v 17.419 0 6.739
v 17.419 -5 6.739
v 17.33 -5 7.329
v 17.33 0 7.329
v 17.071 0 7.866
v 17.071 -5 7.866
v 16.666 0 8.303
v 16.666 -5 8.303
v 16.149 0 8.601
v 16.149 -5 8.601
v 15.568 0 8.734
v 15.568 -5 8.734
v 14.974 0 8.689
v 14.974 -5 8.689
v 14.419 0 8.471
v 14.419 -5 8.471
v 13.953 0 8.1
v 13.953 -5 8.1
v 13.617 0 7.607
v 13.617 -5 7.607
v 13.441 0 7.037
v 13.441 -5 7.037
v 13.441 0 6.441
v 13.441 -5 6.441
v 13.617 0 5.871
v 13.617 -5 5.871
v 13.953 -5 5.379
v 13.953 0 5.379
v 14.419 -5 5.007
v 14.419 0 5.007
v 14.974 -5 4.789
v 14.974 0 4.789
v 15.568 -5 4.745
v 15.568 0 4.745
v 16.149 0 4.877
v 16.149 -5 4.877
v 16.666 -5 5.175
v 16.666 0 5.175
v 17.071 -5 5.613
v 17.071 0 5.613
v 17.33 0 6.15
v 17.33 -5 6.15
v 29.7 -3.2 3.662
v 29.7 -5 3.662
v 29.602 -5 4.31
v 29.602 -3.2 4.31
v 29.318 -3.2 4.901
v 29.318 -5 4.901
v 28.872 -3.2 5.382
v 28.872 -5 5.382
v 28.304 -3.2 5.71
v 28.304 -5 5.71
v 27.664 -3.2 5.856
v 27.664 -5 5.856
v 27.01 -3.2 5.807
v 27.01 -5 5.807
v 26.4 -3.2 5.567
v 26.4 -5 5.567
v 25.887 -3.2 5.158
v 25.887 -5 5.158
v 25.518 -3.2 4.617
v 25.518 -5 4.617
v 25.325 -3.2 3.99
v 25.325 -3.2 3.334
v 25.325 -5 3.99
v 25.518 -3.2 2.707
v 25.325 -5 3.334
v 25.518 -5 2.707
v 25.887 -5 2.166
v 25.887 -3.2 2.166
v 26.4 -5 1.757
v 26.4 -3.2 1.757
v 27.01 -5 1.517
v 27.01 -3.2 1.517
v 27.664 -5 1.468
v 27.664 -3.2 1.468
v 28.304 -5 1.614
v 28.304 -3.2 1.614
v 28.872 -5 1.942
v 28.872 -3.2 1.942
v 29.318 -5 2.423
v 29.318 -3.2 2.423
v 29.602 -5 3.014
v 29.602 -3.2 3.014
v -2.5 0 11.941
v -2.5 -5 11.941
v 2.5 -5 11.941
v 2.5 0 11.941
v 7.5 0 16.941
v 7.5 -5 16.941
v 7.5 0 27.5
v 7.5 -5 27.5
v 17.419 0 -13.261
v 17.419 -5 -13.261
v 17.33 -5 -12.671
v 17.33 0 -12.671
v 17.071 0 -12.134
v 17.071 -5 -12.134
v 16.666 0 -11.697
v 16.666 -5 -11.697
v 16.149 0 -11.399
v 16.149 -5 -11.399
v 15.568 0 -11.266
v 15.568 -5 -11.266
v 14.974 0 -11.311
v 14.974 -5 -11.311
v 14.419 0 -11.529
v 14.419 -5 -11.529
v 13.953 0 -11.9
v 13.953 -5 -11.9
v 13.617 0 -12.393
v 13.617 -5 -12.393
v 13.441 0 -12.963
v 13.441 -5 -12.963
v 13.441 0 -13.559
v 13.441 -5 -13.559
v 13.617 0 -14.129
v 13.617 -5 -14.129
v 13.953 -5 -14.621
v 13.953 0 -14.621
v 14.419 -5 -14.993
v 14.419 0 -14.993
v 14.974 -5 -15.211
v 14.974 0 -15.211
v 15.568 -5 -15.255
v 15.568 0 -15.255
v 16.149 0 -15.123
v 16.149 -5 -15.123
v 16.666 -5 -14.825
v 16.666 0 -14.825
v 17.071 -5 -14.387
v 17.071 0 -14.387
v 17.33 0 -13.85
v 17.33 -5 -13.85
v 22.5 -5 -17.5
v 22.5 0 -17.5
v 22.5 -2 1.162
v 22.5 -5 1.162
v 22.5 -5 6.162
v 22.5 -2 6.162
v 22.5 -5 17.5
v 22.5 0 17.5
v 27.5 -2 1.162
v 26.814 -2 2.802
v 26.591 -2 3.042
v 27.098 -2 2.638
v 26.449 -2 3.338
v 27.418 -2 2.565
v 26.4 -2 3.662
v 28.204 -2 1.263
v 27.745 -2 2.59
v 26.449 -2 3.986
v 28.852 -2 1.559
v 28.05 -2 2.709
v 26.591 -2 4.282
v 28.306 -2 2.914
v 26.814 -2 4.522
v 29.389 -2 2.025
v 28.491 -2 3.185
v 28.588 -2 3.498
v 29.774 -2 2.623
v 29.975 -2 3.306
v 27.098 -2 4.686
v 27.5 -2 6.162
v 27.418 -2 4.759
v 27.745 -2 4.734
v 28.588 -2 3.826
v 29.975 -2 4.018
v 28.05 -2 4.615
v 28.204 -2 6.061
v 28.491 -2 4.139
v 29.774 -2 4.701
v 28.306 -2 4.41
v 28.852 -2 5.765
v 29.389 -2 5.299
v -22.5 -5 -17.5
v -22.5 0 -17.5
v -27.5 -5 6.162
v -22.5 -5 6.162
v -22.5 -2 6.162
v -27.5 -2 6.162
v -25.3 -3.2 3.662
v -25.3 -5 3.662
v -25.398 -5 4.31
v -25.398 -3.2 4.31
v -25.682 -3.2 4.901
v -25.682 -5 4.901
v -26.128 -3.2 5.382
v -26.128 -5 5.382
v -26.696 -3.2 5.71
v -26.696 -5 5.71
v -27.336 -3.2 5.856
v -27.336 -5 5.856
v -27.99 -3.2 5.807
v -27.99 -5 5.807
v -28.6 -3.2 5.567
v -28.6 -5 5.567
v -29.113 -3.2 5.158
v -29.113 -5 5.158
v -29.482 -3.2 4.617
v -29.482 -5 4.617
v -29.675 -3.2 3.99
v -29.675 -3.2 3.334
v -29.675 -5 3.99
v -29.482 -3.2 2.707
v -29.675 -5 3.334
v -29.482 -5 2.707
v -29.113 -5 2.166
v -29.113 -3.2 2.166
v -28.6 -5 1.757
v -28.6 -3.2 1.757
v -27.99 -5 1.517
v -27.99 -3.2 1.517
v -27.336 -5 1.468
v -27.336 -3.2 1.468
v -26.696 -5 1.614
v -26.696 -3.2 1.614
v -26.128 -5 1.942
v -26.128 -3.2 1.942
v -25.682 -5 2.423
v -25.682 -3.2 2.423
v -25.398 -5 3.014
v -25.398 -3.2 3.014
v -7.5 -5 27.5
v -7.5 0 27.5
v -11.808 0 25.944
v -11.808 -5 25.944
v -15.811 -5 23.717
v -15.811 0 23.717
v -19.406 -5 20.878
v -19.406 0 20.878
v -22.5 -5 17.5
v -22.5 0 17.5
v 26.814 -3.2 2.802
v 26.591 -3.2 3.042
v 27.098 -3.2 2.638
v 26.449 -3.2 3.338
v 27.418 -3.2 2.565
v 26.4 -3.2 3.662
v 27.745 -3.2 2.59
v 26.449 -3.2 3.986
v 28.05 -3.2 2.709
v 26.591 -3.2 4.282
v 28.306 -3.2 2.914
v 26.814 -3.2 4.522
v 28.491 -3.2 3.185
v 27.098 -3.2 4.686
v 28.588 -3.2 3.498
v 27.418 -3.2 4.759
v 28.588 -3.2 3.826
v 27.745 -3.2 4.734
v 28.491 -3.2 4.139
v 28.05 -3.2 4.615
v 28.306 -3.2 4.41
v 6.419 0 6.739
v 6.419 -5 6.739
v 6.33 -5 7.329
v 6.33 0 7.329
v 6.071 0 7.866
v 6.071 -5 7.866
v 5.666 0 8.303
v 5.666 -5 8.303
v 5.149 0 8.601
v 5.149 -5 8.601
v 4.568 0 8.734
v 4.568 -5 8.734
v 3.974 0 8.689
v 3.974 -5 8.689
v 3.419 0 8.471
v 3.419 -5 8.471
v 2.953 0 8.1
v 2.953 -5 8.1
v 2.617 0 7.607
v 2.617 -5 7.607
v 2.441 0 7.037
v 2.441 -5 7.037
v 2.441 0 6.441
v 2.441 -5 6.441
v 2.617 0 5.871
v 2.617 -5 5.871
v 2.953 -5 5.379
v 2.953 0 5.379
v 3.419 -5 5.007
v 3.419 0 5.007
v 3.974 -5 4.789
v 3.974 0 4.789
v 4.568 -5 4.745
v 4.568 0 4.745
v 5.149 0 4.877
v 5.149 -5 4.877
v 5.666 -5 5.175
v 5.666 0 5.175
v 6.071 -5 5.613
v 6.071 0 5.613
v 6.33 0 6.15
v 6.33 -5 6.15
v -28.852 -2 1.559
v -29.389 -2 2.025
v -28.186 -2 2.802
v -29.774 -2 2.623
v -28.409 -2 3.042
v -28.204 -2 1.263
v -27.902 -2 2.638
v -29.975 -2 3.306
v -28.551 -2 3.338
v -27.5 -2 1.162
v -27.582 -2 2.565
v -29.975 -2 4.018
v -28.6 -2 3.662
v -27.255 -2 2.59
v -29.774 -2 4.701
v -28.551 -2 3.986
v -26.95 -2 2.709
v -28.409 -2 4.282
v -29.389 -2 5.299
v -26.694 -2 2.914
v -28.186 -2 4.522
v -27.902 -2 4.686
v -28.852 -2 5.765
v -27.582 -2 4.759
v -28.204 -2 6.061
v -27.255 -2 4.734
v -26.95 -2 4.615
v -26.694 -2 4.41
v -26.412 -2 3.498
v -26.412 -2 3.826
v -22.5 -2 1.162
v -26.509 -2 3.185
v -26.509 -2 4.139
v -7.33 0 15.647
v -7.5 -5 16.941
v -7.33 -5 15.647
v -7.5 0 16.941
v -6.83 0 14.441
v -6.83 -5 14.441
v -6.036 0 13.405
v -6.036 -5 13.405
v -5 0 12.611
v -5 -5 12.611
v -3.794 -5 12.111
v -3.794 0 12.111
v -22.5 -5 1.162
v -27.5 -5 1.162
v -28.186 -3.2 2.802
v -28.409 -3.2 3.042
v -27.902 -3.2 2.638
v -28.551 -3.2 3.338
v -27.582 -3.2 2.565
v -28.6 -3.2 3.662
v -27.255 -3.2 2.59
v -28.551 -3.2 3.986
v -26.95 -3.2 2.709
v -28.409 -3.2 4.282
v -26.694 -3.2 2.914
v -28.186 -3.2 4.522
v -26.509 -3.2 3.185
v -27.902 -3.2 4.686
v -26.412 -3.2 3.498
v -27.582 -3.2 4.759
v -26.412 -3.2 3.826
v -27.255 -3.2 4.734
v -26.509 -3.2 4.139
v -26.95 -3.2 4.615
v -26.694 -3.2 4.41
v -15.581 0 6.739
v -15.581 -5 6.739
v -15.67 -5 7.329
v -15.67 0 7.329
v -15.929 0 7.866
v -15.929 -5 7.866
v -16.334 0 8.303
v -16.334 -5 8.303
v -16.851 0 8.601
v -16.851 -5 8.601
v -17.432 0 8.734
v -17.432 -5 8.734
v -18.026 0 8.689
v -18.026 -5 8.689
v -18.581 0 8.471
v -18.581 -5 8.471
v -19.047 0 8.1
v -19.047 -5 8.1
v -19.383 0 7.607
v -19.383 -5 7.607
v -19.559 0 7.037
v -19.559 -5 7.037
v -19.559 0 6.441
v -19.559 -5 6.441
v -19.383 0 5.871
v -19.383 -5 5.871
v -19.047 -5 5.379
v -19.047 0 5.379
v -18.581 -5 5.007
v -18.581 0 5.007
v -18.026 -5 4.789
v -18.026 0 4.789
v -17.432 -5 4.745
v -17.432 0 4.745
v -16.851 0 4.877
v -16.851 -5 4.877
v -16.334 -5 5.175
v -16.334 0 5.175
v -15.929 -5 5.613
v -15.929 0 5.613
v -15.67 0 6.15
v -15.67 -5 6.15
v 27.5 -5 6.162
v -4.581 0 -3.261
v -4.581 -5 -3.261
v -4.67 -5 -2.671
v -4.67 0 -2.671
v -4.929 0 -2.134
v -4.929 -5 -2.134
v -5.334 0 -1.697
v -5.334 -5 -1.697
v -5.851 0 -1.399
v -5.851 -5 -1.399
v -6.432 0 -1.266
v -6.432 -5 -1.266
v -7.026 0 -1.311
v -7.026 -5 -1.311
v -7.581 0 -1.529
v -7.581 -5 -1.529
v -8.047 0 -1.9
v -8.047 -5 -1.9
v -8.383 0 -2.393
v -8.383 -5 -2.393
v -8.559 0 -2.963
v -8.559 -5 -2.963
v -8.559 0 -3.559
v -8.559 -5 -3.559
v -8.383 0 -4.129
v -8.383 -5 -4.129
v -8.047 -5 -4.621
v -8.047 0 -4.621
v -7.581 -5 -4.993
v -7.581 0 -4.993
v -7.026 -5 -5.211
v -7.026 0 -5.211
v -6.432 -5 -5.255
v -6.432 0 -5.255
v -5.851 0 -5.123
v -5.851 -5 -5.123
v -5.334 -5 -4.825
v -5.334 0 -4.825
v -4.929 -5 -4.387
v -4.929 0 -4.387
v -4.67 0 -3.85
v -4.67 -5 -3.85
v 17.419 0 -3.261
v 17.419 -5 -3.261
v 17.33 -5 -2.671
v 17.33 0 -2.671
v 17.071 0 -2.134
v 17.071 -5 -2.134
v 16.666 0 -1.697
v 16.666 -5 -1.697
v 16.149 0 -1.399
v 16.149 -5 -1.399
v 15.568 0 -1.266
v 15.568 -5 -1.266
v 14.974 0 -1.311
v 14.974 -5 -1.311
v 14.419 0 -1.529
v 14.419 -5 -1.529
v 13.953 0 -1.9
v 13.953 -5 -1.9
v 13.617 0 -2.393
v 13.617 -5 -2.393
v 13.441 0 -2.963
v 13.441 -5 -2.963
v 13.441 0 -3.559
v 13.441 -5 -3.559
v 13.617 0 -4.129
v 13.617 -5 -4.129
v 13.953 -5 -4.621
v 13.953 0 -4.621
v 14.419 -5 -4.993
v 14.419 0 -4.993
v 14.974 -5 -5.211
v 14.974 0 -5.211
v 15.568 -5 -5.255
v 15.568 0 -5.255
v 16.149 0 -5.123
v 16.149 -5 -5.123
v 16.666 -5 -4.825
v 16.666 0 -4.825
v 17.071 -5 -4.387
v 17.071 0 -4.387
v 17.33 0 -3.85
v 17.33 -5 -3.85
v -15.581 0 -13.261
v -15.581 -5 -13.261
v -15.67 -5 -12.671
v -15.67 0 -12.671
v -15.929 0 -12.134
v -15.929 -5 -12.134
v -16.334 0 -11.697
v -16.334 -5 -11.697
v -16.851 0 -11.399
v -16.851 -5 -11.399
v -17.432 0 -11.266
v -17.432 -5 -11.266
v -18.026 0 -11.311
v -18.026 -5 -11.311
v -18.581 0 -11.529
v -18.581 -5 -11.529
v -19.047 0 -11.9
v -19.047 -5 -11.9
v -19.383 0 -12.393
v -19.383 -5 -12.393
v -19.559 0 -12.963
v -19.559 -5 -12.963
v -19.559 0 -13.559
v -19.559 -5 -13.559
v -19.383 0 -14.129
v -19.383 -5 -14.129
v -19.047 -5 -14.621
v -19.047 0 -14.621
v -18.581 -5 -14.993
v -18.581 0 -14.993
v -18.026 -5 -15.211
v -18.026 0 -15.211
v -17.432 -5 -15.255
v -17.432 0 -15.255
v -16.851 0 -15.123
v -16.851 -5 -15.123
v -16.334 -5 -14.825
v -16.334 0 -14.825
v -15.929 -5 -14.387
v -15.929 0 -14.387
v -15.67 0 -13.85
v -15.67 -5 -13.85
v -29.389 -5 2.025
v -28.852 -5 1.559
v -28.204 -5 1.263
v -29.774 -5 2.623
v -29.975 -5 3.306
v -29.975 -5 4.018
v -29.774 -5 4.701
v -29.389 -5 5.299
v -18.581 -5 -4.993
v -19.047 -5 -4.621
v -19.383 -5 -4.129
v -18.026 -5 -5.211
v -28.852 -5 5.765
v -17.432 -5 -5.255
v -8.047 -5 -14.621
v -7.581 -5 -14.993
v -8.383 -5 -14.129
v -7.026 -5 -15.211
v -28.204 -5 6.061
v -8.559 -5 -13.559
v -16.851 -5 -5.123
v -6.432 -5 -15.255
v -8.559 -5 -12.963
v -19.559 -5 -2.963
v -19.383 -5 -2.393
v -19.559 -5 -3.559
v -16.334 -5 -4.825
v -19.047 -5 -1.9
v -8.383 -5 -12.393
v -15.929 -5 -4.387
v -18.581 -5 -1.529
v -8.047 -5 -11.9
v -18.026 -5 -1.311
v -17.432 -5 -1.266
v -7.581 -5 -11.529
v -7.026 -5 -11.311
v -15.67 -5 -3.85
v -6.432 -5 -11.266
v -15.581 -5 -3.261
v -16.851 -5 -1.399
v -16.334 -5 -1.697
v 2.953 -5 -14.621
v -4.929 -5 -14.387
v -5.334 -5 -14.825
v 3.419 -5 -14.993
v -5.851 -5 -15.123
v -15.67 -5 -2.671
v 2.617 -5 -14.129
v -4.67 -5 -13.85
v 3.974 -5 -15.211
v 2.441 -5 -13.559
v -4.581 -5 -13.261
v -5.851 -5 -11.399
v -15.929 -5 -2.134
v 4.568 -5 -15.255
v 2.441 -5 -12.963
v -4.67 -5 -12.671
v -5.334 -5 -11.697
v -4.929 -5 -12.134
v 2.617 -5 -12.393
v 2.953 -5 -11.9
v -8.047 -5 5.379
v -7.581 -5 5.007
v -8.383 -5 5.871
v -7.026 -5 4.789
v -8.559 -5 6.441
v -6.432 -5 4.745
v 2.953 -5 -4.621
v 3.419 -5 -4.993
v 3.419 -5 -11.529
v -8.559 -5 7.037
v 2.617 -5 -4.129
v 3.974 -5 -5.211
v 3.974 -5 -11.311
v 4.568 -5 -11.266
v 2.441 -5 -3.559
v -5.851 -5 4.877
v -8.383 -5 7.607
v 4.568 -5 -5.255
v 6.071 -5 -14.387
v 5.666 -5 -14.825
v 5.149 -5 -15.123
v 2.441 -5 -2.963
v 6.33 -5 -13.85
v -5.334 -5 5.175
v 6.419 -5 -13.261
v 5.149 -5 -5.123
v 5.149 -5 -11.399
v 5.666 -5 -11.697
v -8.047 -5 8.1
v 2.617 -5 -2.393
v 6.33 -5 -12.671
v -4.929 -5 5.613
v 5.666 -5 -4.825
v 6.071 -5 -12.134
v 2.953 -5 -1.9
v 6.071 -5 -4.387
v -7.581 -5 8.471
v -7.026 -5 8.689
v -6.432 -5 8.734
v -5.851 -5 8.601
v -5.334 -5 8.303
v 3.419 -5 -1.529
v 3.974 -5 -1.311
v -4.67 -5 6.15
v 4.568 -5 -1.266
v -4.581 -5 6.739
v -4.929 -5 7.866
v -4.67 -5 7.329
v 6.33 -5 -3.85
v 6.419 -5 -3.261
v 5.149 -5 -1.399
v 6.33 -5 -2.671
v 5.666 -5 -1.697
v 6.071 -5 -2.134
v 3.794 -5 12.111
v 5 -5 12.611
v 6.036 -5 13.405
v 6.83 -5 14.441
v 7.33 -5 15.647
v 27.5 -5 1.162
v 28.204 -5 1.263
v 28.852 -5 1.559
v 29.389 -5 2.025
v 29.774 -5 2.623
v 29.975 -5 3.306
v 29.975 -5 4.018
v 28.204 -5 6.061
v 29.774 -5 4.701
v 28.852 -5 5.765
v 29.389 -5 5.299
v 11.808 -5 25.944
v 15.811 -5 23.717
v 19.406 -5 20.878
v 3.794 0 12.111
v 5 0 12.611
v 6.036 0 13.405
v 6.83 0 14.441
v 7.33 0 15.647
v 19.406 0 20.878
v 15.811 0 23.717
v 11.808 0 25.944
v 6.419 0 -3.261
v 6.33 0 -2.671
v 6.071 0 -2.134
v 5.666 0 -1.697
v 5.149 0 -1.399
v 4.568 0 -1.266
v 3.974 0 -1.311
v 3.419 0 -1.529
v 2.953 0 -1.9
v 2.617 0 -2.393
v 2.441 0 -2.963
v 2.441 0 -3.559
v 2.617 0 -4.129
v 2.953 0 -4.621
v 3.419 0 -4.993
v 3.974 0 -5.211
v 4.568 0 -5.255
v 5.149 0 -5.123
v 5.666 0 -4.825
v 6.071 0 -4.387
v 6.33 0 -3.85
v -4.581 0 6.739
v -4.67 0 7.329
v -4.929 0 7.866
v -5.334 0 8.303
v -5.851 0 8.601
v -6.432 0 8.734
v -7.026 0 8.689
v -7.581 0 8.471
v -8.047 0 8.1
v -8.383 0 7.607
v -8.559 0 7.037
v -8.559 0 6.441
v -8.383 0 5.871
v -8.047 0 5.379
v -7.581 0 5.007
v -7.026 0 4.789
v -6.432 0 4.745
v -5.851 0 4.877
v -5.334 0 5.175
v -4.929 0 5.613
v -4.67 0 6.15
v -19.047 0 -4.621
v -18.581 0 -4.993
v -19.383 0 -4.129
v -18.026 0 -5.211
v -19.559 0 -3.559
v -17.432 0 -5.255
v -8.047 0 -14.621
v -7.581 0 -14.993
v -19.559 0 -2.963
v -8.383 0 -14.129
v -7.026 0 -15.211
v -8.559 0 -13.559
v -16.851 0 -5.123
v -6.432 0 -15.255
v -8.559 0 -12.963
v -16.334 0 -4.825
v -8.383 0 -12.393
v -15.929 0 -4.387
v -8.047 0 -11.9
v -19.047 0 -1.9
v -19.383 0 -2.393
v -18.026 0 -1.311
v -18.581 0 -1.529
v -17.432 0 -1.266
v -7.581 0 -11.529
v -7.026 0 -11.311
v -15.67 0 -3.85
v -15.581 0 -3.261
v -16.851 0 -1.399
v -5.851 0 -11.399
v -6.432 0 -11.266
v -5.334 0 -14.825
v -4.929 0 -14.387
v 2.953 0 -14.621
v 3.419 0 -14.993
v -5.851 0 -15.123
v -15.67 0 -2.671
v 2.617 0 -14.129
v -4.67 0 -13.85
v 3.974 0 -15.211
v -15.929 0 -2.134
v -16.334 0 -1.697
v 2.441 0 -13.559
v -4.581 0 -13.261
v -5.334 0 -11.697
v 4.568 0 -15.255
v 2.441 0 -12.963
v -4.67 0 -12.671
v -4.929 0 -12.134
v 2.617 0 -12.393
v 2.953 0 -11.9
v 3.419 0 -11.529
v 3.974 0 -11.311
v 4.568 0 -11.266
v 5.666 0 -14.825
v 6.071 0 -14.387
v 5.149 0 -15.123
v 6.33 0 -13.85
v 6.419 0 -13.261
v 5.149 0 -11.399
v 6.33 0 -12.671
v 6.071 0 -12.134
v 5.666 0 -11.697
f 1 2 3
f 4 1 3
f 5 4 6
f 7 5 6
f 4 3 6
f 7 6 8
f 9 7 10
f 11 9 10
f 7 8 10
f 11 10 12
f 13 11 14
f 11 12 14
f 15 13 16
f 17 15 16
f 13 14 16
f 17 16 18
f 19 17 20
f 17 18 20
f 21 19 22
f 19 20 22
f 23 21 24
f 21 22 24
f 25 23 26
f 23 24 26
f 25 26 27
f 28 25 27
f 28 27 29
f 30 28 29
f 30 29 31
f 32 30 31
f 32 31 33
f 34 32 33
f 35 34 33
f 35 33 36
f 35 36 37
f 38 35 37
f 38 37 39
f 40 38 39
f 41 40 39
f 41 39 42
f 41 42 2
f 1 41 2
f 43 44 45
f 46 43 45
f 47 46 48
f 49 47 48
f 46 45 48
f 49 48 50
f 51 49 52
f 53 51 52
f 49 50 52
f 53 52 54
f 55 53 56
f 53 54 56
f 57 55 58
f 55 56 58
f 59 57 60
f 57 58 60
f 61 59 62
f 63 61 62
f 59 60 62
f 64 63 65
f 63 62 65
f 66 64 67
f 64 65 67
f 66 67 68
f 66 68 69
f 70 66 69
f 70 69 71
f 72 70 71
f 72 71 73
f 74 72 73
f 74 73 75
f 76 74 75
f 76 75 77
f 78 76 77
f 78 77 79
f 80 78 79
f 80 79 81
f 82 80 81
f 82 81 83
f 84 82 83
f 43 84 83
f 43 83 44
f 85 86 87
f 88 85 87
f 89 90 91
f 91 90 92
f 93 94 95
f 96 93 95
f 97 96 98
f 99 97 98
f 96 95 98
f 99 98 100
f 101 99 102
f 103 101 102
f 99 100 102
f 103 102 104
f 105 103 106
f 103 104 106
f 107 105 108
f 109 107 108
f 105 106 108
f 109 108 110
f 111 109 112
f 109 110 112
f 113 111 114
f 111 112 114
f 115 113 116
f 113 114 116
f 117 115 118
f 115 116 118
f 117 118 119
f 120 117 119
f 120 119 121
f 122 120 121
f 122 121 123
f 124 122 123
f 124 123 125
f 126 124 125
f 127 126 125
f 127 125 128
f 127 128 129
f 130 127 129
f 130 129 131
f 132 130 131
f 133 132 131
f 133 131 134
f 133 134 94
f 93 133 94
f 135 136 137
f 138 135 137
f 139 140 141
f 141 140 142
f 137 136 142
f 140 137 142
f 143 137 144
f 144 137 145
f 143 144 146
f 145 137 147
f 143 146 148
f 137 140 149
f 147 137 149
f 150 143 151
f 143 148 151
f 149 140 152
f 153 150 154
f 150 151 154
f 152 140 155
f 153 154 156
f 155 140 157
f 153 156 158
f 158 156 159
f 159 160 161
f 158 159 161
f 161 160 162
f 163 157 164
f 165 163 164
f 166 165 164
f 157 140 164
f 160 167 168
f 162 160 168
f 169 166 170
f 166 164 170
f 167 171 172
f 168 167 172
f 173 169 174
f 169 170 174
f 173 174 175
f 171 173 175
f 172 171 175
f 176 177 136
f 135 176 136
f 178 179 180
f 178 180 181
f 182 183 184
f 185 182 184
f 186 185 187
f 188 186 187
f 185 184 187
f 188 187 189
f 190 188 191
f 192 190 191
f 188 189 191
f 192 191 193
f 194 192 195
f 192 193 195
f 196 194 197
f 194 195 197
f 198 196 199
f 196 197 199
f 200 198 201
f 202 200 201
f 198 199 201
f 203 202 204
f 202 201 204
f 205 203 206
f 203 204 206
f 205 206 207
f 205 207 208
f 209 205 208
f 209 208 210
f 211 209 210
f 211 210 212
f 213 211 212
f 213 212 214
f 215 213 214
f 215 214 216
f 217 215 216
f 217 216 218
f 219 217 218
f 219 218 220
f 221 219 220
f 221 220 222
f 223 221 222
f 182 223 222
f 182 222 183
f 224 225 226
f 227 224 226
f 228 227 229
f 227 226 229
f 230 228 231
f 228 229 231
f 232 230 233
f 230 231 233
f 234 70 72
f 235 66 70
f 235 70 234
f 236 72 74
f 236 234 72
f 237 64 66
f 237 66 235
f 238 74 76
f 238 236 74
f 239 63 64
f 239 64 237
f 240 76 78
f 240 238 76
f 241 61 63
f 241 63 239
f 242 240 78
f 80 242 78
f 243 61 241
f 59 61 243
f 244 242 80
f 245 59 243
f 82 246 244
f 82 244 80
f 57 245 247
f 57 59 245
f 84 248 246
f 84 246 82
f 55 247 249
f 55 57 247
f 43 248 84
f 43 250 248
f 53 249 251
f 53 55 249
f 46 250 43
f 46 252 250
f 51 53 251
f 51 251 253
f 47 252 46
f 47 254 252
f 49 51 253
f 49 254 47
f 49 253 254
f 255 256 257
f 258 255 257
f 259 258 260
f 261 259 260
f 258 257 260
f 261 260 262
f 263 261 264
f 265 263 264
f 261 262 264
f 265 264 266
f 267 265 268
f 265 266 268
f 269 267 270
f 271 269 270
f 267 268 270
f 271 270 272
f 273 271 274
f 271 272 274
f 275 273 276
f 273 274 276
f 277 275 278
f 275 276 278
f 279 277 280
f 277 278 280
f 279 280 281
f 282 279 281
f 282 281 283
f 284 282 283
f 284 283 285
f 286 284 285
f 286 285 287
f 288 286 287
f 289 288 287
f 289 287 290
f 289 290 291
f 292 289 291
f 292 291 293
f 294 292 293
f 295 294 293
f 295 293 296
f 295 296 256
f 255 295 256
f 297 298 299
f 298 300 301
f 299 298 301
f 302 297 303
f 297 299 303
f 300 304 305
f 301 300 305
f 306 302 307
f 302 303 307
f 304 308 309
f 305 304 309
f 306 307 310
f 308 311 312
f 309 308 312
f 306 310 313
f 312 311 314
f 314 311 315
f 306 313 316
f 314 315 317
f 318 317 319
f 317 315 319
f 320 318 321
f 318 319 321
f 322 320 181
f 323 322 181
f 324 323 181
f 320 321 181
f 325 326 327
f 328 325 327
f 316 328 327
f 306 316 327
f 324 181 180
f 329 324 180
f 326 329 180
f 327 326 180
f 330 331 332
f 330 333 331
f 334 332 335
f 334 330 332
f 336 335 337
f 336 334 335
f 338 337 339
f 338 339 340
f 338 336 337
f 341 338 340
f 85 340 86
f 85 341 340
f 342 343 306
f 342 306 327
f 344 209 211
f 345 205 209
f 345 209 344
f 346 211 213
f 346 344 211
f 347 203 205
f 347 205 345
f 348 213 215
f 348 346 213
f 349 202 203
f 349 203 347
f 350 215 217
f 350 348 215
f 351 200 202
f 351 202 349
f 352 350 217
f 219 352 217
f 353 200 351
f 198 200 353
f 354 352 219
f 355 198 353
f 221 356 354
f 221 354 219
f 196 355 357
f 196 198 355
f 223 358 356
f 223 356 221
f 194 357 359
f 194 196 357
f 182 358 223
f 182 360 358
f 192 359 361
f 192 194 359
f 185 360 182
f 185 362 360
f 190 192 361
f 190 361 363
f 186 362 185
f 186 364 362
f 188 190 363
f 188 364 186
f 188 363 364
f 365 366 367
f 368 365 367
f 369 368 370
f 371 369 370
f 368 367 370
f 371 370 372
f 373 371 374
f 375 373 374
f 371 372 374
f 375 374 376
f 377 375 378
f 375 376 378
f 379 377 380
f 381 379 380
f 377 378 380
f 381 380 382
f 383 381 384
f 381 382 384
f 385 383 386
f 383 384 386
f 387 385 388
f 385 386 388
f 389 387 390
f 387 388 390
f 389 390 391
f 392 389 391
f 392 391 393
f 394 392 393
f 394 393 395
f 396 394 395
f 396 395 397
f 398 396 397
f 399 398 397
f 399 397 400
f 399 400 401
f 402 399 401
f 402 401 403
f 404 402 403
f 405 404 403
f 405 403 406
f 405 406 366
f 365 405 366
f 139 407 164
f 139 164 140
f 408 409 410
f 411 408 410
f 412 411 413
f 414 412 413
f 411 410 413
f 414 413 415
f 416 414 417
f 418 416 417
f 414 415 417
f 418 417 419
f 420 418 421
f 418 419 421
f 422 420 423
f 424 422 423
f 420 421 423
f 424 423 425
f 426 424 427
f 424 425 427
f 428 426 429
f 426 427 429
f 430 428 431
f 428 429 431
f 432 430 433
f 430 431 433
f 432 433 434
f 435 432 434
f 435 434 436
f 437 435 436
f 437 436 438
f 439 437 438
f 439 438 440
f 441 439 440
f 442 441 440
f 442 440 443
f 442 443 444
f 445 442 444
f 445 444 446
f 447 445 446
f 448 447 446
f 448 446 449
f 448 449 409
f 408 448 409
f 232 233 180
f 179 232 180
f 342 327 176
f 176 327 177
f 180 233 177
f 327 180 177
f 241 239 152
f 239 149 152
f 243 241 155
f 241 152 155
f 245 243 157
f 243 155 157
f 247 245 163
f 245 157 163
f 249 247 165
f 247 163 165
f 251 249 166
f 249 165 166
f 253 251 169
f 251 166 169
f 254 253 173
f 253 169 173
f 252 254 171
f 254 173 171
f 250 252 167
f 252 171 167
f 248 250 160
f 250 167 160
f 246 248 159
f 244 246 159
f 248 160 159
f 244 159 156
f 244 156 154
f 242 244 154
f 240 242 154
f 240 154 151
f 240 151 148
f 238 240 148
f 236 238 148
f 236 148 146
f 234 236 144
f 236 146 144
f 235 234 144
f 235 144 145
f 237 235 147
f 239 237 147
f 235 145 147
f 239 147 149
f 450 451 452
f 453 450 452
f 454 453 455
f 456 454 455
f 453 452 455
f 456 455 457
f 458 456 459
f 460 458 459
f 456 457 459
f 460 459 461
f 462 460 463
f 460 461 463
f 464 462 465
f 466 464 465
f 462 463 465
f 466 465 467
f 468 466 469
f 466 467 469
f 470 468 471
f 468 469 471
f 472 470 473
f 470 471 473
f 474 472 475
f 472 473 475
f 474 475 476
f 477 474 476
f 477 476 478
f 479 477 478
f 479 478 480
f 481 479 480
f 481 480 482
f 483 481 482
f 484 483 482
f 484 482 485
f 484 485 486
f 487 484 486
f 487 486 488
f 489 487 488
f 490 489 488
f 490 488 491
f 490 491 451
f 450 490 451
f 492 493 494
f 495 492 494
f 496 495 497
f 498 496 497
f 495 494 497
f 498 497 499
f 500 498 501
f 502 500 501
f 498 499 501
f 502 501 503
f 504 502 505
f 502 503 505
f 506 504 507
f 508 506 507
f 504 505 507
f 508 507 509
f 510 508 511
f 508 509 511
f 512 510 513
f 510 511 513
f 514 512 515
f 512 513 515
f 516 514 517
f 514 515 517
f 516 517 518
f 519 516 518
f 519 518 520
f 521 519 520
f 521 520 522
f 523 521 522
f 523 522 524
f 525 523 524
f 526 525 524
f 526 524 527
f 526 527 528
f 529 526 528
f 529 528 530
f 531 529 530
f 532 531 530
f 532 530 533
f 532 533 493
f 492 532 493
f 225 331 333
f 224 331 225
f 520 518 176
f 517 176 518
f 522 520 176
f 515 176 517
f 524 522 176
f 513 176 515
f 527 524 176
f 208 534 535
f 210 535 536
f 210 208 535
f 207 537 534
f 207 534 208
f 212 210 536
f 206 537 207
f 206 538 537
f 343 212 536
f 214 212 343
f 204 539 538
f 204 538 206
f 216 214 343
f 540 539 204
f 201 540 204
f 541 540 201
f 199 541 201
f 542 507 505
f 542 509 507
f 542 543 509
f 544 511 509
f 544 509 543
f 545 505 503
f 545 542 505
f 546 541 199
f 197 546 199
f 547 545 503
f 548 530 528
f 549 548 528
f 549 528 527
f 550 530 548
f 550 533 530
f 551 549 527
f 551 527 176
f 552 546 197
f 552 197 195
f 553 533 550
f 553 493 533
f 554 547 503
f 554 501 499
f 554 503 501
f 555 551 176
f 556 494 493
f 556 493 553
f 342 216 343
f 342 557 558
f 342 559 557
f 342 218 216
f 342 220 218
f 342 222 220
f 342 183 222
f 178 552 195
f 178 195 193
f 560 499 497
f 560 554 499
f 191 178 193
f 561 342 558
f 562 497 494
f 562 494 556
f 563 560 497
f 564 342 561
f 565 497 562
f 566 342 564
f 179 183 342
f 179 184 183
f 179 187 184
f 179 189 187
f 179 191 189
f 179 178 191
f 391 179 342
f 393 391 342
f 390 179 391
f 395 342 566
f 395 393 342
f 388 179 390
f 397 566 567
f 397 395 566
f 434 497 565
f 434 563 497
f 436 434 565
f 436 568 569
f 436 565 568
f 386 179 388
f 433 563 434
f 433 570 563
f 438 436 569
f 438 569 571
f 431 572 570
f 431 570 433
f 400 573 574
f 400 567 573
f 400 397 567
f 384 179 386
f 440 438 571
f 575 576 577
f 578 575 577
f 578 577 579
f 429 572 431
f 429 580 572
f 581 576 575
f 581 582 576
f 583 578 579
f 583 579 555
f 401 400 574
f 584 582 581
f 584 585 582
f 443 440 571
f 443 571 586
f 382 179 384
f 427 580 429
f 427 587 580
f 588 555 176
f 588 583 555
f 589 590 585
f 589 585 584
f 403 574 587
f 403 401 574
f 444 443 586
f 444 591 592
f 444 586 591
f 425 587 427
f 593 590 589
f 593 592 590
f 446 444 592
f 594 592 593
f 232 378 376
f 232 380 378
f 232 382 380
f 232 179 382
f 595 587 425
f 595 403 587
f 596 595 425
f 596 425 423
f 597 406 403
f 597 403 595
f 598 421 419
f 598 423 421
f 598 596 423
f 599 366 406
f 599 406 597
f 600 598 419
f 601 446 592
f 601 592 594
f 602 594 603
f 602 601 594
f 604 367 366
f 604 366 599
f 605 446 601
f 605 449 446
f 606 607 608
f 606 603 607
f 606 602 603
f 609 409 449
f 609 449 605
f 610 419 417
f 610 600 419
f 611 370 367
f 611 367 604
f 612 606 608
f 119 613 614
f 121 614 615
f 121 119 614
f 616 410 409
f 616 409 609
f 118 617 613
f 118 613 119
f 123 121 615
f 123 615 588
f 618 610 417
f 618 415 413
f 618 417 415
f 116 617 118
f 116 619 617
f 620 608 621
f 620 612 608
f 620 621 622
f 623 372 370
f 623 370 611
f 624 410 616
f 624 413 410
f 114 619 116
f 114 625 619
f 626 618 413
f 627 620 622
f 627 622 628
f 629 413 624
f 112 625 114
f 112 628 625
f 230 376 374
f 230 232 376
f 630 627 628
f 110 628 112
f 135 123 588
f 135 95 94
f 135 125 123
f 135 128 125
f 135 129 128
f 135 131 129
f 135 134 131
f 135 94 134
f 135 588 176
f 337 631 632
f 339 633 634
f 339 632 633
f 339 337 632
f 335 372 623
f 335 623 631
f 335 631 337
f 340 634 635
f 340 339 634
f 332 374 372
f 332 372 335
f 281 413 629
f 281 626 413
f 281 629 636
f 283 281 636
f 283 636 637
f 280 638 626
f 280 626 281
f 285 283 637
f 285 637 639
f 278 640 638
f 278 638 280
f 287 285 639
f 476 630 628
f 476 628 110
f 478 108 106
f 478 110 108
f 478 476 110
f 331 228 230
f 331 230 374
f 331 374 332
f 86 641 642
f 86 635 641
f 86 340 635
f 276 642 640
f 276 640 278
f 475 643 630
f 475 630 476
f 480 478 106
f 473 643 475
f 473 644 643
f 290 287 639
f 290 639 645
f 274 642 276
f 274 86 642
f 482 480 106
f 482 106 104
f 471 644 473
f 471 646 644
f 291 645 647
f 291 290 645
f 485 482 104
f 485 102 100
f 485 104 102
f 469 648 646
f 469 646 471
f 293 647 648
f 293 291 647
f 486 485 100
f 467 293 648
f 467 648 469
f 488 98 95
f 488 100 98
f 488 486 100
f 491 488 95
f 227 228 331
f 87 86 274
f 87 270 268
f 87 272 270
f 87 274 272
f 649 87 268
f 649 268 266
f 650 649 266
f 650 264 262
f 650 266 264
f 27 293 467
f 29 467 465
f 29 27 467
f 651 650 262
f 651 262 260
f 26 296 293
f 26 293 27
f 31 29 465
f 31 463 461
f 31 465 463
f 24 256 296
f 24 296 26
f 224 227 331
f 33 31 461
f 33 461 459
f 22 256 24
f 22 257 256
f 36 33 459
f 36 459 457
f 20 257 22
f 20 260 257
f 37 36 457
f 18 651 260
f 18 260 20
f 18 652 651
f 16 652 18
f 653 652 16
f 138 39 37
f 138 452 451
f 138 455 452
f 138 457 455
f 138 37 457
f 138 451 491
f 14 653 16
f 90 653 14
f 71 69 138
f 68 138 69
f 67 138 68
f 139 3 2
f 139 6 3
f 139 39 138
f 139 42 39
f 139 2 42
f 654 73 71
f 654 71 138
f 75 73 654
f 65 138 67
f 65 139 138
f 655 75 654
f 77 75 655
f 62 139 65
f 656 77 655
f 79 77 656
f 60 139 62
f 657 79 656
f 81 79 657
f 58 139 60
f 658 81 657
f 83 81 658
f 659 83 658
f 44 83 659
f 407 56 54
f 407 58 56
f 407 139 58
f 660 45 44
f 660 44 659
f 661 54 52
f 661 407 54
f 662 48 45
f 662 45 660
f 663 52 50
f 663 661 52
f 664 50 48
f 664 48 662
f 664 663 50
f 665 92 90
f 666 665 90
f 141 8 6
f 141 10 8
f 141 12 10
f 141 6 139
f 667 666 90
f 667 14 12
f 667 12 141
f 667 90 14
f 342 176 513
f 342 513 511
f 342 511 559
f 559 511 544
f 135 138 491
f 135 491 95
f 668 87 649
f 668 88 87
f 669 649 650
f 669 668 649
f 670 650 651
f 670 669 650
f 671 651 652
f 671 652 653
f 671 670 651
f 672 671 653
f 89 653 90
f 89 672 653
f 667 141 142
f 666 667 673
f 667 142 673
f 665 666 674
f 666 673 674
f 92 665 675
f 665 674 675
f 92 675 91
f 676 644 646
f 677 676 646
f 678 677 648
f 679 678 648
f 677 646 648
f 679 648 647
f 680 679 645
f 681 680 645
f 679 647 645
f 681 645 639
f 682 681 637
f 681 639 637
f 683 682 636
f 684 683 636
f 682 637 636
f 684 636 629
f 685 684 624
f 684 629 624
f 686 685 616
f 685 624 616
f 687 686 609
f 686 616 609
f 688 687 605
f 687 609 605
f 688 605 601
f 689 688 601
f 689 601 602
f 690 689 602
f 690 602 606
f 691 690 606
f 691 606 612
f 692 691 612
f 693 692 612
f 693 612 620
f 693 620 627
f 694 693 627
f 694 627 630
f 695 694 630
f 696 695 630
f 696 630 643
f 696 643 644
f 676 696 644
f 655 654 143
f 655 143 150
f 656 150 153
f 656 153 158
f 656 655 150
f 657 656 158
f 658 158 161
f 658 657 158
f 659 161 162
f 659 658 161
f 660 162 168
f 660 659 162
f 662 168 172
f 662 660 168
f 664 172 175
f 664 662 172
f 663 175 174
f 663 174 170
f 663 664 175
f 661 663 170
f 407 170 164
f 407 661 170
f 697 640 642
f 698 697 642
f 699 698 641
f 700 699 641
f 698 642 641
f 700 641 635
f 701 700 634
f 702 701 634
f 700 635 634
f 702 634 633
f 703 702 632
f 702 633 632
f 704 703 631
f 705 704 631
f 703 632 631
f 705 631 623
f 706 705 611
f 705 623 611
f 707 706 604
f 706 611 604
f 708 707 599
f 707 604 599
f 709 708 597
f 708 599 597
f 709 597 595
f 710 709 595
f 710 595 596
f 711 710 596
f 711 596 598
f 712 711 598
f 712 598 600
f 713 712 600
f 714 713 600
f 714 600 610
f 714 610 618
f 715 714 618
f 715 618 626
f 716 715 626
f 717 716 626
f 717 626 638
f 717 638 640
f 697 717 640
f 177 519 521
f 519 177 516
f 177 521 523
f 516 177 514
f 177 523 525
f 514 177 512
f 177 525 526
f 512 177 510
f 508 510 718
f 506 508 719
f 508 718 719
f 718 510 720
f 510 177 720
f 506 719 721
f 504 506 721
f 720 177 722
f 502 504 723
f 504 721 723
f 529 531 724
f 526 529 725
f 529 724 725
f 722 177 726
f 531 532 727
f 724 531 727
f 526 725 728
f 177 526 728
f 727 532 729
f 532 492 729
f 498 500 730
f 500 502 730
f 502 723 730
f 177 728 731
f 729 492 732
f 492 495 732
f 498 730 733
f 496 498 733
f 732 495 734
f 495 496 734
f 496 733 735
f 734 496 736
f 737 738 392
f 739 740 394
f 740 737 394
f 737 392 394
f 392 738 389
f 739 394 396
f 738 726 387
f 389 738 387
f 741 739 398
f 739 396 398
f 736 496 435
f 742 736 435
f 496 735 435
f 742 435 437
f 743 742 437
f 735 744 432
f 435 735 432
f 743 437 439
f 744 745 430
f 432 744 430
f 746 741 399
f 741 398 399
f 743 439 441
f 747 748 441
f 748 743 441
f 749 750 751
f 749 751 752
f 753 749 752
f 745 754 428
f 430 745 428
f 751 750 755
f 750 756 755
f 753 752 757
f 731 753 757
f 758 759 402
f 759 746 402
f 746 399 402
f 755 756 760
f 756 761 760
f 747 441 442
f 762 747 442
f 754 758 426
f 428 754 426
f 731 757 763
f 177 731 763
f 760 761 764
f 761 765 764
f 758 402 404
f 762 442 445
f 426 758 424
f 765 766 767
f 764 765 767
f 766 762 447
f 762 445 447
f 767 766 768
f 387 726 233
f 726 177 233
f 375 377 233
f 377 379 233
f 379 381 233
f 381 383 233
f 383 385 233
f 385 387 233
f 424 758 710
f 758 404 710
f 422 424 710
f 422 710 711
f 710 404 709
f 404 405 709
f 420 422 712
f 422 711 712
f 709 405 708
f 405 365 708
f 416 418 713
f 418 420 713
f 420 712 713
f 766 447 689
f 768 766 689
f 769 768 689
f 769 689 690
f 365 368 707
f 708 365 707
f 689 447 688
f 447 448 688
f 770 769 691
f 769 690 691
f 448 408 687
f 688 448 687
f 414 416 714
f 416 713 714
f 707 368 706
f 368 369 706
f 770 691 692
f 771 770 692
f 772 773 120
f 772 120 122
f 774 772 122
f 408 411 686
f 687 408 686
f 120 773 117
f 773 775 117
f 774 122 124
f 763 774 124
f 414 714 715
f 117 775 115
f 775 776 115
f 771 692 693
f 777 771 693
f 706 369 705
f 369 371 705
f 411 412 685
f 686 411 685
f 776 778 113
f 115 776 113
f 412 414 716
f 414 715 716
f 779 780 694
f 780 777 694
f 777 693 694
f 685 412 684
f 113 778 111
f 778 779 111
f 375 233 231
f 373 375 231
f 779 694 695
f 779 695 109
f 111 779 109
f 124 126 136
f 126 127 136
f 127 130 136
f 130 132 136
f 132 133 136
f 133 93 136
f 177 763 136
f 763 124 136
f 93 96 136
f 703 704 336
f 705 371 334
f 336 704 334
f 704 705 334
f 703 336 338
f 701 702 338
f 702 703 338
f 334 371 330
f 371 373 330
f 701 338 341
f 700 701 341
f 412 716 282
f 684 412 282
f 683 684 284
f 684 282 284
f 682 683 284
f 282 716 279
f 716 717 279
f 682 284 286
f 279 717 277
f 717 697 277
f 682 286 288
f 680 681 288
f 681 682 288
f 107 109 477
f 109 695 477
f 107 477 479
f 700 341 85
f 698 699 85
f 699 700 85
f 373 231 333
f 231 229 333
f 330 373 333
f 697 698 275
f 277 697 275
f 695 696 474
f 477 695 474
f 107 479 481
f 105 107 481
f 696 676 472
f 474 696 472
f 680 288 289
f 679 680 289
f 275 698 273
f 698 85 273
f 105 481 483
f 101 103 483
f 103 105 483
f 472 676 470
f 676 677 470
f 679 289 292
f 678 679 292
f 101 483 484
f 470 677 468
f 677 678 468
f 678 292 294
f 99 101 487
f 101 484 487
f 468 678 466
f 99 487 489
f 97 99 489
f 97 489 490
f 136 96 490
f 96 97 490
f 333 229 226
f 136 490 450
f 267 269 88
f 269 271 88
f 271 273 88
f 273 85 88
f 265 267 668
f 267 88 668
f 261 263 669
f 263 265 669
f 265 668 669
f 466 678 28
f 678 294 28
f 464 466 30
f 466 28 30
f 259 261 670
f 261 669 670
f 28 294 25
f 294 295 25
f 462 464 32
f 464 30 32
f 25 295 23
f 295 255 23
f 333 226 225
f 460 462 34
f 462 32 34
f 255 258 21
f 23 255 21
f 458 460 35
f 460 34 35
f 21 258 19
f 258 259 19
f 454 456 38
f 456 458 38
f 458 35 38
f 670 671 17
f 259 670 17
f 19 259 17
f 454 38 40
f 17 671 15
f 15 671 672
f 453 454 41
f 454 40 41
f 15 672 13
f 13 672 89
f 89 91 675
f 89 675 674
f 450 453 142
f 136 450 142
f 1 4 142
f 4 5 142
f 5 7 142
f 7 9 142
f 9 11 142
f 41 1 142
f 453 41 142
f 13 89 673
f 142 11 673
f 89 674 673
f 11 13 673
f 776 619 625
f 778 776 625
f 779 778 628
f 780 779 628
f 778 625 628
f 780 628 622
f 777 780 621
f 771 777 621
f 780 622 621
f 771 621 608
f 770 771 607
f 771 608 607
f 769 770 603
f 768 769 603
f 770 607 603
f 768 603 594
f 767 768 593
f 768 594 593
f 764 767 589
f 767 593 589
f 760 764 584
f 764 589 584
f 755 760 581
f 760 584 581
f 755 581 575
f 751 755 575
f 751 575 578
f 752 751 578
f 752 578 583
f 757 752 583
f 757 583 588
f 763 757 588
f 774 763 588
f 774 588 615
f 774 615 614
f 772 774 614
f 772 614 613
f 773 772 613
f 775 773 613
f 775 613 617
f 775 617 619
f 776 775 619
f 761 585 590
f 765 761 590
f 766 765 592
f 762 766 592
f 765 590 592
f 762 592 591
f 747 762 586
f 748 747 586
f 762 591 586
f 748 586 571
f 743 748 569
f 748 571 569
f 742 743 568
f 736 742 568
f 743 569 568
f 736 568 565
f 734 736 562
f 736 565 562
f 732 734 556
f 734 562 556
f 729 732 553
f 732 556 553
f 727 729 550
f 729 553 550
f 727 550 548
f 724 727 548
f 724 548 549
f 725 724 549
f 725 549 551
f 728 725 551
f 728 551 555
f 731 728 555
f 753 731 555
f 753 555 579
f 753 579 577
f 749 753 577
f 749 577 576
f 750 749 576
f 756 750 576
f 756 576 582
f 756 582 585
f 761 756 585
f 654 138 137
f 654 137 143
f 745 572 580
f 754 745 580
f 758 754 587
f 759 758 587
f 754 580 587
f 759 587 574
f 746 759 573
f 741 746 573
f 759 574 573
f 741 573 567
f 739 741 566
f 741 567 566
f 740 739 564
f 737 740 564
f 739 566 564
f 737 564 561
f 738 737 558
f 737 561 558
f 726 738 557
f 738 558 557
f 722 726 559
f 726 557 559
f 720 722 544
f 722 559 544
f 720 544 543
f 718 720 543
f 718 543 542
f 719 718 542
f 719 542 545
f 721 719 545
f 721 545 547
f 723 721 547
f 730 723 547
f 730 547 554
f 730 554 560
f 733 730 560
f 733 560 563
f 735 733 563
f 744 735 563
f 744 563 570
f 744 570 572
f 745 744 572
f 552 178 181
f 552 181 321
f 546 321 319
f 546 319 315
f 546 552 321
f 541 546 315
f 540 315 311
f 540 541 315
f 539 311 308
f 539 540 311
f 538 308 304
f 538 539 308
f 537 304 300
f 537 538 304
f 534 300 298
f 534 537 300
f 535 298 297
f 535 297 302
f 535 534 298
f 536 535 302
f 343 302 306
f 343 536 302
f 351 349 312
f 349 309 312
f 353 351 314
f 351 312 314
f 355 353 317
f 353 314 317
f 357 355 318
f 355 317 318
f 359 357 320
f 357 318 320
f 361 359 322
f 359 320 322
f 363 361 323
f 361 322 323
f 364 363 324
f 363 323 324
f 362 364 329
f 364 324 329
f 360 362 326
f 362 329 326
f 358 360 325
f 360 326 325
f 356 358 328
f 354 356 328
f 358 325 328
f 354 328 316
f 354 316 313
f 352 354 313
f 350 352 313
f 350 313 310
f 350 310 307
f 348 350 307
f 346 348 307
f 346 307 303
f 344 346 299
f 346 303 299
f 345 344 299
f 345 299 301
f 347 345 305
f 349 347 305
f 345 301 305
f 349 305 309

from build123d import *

# Parameters (mm, degrees)
F1_DEPTH       = 5
F2_W           = 15
F2_H           = 33.127493
F3_DEPTH       = 25
F4_R           = 5
F6_DEPTH       = 3
F7_D           = 2.2
F7_DEPTH       = 40
F7_CBORE_D     = 4.4
F7_CBORE_DEPTH = 1.8
F8_R           = 2
F9_DEPTH       = 25


with BuildPart() as f1:
    # F0 (on Front) → F1 (new body)
    with BuildSketch(Plane.XZ):
        with BuildLine():
            Line((-22.5, -17.5), (22.5, -17.5))
            Line((22.5, -17.5), (22.5, 17.5))
            ThreePointArc((22.5, 17.5), (0, 28.504386), (-22.5, 17.5))
            Line((-22.5, 17.5), (-22.5, -17.5))
        make_face()
    extrude(amount=F1_DEPTH)

    # F2 (on face) → F3 (cut)
    with BuildSketch(Plane.XZ.offset(5)):
        with Locations((0, 28.504385)):
            Rectangle(F2_W, F2_H)
    extrude(amount=-F3_DEPTH, mode=Mode.SUBTRACT)

    # F4
    f4_edges = [f1.edges().sort_by_distance(p)[0] for p in [
        (-7.5, -2.5, 11.940639),
        (7.5, -2.5, 11.940639),
    ]]
    fillet(f4_edges, radius=F4_R)

    # F5 (on face) → F6 (join)
    with BuildSketch(Plane.XZ.offset(5)):
        with BuildLine():
            Line((-22.5, 1.162), (-22.5, 6.162))
            Line((-22.5, 6.162), (-27.5, 6.162))
            ThreePointArc((-27.5, 6.162), (-30, 3.662), (-27.5, 1.162))
            Line((-27.5, 1.162), (-22.5, 1.162))
        make_face()
        with BuildLine():
            Line((22.5, 1.162), (27.5, 1.162))
            ThreePointArc((27.5, 1.162), (30, 3.662), (27.5, 6.162))
            Line((27.5, 6.162), (22.5, 6.162))
            Line((22.5, 6.162), (22.5, 1.162))
        make_face()
    extrude(amount=-F6_DEPTH)

    # F7
    with Locations(Plane.XZ.offset(5)):
        with Locations((-27.5, 3.662), (27.5, 3.662)):
            CounterBoreHole(F7_D / 2, F7_CBORE_D / 2, F7_CBORE_DEPTH, depth=F7_DEPTH)

    # F8 (on face) → F9 (cut)
    with BuildSketch(Plane.XZ.offset(5)):
        with Locations((-17.581366, -13.26084)):
            Circle(F8_R)
        with Locations((-17.581366, -3.26084)):
            Circle(F8_R)
        with Locations((-17.581366, 6.73916)):
            Circle(F8_R)
        with Locations((-6.581366, -13.26084)):
            Circle(F8_R)
        with Locations((-6.581366, -3.26084)):
            Circle(F8_R)
        with Locations((-6.581366, 6.73916)):
            Circle(F8_R)
        with Locations((4.418634, -13.26084)):
            Circle(F8_R)
        with Locations((4.418634, -3.26084)):
            Circle(F8_R)
        with Locations((4.418634, 6.73916)):
            Circle(F8_R)
        with Locations((15.418634, -13.26084)):
            Circle(F8_R)
        with Locations((15.418634, -3.26084)):
            Circle(F8_R)
        with Locations((15.418634, 6.73916)):
            Circle(F8_R)
    extrude(amount=-F9_DEPTH, mode=Mode.SUBTRACT)


solid = f1.part
